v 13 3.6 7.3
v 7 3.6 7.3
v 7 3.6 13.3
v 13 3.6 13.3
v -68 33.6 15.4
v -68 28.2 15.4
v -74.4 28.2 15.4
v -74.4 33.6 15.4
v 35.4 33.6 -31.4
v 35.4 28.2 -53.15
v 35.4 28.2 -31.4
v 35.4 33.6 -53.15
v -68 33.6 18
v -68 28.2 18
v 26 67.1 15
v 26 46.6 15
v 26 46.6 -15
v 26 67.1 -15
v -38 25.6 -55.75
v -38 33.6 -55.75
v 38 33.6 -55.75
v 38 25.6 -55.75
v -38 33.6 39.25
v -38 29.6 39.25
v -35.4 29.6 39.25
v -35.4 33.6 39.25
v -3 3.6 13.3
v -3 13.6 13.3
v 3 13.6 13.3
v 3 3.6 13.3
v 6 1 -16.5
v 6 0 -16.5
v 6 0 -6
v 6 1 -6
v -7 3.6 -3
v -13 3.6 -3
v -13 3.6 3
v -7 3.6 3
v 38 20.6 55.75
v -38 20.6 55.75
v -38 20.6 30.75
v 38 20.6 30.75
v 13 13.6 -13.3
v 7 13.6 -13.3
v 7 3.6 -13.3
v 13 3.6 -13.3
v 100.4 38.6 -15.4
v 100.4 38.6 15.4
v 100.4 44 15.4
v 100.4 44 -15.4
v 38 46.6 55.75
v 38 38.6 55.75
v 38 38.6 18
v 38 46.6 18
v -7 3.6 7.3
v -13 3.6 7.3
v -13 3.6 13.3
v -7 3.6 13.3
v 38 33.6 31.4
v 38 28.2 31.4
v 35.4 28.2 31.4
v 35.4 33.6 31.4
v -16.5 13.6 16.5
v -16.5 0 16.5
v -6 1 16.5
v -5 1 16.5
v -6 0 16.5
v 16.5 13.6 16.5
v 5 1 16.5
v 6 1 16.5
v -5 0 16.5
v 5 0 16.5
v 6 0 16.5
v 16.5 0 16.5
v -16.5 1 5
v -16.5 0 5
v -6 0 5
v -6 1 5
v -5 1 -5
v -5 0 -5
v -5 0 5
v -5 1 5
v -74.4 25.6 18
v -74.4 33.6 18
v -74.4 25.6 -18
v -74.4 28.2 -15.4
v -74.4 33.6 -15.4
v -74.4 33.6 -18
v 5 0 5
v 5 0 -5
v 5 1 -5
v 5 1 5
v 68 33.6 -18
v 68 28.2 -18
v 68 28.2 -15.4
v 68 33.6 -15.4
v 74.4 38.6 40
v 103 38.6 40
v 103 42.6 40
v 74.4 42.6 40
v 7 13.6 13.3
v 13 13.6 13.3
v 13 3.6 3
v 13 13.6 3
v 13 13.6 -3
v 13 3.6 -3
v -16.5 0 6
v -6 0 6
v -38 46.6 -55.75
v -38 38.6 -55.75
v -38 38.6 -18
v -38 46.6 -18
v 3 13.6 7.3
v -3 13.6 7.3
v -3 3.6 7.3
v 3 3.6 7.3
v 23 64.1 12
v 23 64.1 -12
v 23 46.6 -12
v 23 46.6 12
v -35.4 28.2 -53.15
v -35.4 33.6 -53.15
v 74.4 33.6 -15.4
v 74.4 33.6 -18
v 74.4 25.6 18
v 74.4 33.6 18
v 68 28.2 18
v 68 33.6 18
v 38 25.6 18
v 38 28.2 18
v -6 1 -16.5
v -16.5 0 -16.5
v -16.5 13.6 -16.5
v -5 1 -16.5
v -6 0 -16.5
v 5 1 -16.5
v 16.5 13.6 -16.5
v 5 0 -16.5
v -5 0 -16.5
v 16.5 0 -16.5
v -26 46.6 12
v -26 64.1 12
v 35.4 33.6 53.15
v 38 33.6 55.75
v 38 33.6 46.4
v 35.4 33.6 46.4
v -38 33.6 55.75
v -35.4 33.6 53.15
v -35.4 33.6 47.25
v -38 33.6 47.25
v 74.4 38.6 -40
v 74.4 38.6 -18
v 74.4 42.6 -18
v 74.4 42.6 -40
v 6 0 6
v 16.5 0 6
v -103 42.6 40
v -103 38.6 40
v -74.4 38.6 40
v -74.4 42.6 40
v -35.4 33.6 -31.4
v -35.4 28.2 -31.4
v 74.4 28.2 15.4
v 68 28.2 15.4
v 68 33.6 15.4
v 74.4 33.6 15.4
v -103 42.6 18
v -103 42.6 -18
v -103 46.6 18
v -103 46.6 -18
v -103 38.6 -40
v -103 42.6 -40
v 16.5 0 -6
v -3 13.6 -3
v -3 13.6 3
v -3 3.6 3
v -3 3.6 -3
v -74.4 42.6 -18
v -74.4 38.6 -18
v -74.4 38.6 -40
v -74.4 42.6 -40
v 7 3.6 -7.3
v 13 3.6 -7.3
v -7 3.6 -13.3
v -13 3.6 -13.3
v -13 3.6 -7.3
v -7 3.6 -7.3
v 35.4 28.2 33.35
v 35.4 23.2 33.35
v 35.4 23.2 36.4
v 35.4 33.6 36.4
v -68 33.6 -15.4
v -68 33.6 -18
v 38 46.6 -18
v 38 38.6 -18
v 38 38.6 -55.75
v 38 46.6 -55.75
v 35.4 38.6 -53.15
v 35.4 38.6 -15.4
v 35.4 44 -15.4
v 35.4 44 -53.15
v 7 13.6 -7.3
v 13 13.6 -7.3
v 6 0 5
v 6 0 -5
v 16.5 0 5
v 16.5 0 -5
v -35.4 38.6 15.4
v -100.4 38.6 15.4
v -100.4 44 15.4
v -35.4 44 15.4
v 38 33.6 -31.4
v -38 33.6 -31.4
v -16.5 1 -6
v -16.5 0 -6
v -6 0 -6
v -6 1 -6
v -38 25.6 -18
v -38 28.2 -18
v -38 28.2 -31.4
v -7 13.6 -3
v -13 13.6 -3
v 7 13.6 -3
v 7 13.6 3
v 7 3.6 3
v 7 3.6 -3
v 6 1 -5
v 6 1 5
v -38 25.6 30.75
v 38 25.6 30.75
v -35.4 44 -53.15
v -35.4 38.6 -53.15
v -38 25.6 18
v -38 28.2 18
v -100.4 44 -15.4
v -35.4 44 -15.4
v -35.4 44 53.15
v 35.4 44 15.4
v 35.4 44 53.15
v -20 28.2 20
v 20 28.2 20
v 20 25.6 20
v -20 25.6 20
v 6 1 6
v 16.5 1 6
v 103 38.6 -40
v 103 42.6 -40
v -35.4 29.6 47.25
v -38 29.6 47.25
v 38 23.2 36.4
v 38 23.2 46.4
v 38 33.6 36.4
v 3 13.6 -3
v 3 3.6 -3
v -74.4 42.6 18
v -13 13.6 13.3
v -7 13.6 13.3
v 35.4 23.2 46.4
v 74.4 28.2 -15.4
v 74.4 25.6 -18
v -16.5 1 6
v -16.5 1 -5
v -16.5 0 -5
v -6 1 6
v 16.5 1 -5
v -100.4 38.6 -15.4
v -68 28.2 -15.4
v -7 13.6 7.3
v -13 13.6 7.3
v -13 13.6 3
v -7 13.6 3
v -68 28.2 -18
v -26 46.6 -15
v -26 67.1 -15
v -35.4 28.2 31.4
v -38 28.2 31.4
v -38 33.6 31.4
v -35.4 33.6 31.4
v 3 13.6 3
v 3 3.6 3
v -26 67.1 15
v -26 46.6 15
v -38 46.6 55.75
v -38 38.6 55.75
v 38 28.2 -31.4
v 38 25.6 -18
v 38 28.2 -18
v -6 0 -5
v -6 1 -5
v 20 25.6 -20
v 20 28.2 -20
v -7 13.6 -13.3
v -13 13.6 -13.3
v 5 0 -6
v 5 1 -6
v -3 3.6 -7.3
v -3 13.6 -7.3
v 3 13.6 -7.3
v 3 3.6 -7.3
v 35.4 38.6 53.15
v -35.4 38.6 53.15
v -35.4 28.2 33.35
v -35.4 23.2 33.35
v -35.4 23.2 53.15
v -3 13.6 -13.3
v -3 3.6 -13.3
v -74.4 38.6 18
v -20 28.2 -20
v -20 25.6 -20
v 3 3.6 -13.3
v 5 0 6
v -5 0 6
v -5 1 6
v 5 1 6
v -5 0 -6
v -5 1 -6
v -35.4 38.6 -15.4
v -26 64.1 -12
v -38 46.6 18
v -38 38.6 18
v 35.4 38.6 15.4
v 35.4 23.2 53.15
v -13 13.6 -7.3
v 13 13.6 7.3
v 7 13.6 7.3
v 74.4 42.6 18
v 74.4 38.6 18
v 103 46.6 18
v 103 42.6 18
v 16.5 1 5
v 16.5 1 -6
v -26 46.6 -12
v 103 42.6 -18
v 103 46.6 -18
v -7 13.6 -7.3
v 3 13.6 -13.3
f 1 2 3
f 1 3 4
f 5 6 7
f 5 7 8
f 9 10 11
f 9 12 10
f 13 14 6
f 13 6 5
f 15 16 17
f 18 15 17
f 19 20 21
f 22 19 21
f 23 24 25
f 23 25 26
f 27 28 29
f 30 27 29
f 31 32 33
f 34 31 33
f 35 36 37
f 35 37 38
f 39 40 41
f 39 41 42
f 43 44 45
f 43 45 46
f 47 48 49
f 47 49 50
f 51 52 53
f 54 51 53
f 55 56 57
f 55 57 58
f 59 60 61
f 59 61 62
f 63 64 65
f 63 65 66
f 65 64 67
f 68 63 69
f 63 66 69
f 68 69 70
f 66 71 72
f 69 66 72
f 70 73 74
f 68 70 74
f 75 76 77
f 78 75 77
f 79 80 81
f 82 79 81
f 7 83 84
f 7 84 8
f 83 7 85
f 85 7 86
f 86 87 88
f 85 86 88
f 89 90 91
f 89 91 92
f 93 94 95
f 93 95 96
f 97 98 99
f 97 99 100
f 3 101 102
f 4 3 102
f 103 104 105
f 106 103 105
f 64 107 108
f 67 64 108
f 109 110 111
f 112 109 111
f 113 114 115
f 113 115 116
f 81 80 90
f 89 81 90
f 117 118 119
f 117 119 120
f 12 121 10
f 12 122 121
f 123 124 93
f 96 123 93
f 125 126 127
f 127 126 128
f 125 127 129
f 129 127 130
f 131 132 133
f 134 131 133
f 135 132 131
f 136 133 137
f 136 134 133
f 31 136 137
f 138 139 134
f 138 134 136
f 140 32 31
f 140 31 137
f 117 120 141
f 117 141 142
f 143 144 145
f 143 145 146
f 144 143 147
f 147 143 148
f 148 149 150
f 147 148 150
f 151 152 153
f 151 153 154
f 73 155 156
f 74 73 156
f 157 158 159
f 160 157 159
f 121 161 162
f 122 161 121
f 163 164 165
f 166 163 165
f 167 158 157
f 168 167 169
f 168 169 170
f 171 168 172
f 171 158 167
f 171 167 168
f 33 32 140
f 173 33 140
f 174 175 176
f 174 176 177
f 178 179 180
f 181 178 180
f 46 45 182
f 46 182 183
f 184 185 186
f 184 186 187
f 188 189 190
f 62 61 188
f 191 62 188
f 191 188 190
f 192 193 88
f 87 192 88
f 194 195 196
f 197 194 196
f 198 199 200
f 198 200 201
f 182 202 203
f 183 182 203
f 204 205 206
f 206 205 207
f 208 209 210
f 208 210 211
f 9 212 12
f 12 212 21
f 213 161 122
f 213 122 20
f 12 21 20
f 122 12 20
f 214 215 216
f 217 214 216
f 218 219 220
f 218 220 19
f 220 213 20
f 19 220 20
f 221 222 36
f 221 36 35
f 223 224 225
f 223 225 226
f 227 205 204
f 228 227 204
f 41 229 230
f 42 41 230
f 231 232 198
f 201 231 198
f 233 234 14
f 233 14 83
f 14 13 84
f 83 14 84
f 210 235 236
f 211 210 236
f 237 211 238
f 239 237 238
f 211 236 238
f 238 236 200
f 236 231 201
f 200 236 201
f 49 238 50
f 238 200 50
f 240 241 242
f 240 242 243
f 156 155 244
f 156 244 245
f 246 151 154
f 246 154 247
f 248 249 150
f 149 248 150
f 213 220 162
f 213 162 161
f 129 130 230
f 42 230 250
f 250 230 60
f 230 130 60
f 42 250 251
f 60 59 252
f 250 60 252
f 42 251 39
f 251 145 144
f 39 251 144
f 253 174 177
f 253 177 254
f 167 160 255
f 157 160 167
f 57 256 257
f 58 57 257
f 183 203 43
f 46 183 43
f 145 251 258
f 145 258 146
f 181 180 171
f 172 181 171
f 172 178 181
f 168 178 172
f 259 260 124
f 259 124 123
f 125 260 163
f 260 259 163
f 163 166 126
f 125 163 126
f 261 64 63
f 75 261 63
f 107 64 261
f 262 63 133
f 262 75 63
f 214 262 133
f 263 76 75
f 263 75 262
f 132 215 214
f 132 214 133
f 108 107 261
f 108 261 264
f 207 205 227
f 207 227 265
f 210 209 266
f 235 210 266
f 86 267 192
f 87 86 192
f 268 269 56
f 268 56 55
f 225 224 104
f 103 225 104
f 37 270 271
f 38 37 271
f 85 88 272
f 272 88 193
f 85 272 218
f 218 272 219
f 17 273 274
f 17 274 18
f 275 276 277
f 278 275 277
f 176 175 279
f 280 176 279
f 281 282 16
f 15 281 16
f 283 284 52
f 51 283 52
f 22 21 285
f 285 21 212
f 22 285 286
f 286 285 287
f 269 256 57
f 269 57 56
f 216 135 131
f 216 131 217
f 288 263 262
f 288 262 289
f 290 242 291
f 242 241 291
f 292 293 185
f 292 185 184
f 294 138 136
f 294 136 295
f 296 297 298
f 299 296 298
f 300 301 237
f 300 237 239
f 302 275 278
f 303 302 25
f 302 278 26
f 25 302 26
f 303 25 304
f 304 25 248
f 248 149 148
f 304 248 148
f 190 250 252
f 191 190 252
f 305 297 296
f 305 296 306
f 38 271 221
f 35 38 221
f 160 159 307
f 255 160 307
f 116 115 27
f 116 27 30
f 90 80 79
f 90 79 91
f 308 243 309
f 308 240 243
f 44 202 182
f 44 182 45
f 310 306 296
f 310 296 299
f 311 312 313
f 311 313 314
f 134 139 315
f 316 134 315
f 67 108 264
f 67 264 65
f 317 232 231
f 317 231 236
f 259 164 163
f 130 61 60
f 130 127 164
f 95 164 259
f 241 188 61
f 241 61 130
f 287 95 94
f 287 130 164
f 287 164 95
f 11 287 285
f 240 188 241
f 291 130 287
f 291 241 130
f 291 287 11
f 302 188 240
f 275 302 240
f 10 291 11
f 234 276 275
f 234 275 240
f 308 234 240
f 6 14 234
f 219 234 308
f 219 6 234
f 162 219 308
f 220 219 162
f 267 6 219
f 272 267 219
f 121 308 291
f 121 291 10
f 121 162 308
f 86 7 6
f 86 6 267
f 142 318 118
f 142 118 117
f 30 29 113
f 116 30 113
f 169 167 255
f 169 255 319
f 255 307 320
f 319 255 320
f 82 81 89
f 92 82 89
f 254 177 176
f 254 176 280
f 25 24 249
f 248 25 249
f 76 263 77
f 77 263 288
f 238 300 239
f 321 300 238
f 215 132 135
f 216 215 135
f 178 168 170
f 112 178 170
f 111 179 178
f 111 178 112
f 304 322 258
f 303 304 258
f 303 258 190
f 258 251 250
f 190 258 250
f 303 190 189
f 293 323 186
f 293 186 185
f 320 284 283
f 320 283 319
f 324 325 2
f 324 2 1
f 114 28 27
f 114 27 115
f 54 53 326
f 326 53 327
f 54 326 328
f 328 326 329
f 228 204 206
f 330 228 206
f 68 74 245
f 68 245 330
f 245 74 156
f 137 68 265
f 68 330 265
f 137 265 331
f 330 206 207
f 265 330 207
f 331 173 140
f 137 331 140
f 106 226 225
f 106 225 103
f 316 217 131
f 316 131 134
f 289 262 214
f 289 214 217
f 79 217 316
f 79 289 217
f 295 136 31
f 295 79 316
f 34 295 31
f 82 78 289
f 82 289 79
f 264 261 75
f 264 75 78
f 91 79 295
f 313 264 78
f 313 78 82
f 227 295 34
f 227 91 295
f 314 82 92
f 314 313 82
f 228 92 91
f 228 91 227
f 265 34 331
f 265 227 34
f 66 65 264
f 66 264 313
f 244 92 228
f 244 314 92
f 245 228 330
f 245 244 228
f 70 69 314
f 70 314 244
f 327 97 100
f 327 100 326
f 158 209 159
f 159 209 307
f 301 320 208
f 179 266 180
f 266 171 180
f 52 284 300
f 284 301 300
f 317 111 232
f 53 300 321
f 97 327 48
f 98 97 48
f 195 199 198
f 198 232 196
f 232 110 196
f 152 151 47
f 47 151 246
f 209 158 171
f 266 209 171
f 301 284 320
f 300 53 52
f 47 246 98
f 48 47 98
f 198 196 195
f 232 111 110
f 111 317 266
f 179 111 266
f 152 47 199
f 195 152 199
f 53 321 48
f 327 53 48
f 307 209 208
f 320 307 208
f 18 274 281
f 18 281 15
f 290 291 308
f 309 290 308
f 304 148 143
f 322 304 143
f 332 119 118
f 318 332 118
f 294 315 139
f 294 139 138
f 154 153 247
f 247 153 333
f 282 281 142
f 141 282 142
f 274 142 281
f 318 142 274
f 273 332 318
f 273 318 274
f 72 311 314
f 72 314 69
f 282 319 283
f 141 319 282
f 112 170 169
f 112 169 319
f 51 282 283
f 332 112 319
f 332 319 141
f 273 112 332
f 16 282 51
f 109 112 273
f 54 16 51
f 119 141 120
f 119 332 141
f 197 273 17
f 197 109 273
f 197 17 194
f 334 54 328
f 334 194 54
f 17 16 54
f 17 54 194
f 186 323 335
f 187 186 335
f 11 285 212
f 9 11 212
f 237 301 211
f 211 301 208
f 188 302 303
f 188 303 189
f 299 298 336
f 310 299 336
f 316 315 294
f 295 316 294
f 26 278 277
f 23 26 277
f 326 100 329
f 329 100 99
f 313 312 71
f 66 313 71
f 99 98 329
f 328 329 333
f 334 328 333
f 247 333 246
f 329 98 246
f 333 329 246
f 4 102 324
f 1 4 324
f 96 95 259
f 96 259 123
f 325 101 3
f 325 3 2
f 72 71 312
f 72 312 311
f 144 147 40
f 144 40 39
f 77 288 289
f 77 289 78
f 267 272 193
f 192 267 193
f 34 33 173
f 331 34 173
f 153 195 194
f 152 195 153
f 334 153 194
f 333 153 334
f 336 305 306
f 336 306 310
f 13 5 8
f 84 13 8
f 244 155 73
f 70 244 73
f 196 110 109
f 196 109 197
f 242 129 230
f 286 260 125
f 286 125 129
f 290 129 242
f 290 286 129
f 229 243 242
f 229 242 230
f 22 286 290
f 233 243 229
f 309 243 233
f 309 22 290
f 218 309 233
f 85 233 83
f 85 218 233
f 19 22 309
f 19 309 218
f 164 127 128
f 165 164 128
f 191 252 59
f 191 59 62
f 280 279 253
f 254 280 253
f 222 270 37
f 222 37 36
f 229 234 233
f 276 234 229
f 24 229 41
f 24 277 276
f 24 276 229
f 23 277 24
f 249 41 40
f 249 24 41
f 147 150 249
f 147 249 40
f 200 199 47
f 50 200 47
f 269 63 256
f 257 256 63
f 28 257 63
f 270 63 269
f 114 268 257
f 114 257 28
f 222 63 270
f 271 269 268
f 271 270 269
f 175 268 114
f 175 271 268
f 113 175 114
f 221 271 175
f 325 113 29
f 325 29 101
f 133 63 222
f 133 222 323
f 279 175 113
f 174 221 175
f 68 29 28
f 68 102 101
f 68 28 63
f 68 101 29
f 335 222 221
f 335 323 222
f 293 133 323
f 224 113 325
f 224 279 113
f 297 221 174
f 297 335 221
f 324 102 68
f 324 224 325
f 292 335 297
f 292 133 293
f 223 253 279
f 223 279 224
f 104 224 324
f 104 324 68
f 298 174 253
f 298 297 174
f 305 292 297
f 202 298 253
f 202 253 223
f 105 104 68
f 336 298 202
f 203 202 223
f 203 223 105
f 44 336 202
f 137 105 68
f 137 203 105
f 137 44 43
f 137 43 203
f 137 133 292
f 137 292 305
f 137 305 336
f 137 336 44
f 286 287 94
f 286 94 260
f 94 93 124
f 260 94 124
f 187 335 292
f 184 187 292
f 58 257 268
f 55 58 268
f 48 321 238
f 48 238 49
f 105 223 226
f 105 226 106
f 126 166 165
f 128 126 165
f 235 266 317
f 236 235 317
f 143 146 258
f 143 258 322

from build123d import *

# Parameters (mm, degrees)
SKETCH1_W               = 33
SKETCH1_H               = 33
BOSS_EXTRUDE1_DEPTH     = 13.6
SKETCH2_W               = 6
SKETCH2_H               = 6
CUT_EXTRUDE1_DEPTH      = 10
LPATTERN1_COUNT         = 5
LPATTERN1_PITCH         = 10.3
LPATTERN2_COUNT         = 2
LPATTERN2_PITCH         = 10.3
SKETCH3_W               = 1
SKETCH3_H               = 33
SKETCH3_W_2             = 33
SKETCH3_H_2             = 1
CUT_EXTRUDE_THIN1_DEPTH = 1
SKETCH4_W               = 76
SKETCH4_H               = 37.75
SKETCH4_H_2             = 36
SKETCH4_W_2             = 65
BOSS_EXTRUDE2_DEPTH     = 8
SHELL1_T                = -2.6
SKETCH5_W               = 40
SKETCH5_H               = 40
BOSS_EXTRUDE3_DEPTH     = 8
SKETCH6_W               = 76
SKETCH6_H               = 25
BOSS_EXTRUDE4_DEPTH     = 5
SHELL2_T                = -2.6
BOSS_EXTRUDE5_DEPTH     = 4
SKETCH8_W               = 8
SKETCH8_H               = 8
CUT_EXTRUDE2_DEPTH      = 2.6
SKETCH9_W               = 52
SKETCH9_H               = 30
BOSS_EXTRUDE6_DEPTH     = 20.5
SKETCH10_W              = 24
SKETCH10_H              = 17.5
CUT_EXTRUDE3_DEPTH      = 49
SKETCH11_W              = 16
SKETCH11_H              = 5.4
CUT_EXTRUDE4_DEPTH      = 2.6
SKETCH13_W              = 30
SKETCH13_H              = 5.4
CUT_EXTRUDE5_DEPTH      = 2.6
MIRROR3_COPY_1_SKETCH_W = 16
MIRROR3_COPY_1_SKETCH_H = 5.4
MIRROR3_COPY_1_DEPTH    = 2.6
MIRROR3_COPY_2_SKETCH_W = 30
MIRROR3_COPY_2_SKETCH_H = 5.4
MIRROR3_COPY_2_DEPTH    = 2.6
SKETCH14_W              = 10
SKETCH14_H              = 10.4
CUT_EXTRUDE6_DEPTH      = 2.6
CUT_EXTRUDE7_DEPTH      = 198.689737973
CUT_EXTRUDE7_DEPTH_BACK = 198.689737973
SKETCH15_W              = 30.8
SKETCH15_H              = 5.4


with BuildPart() as part:
    # Sketch1 → Boss-Extrude1 (new body)
    with BuildSketch(Plane(origin=(0, 0, 0), x_dir=(1, 0, 0), z_dir=(0, 1, 0))):
        Rectangle(SKETCH1_W, SKETCH1_H)
    extrude(amount=BOSS_EXTRUDE1_DEPTH)

    # Sketch2 → Cut-Extrude1 (cut)
    with BuildSketch(Plane(origin=(0, 13.6, 0), x_dir=(1, 0, 0), z_dir=(0, 1, 0))):
        Rectangle(SKETCH2_W, SKETCH2_H)
        with Locations((-10, 0)):
            Rectangle(SKETCH2_W, SKETCH2_H)
        with Locations((10, 0)):
            Rectangle(SKETCH2_W, SKETCH2_H)
    cut_extrude1 = extrude(amount=-CUT_EXTRUDE1_DEPTH, mode=Mode.SUBTRACT)

    # LPattern1: Cut-Extrude1 ×5
    with Locations(*[(0, 0, i * LPATTERN1_PITCH) for i in range(1, LPATTERN1_COUNT)]):
        add(cut_extrude1, mode=Mode.SUBTRACT)

    # LPattern2: Cut-Extrude1 ×2
    with Locations(*[(0, 0, -i * LPATTERN2_PITCH) for i in range(1, LPATTERN2_COUNT)]):
        add(cut_extrude1, mode=Mode.SUBTRACT)

    # Sketch3 → Cut-Extrude-Thin1 (cut)
    with BuildSketch(Plane.XZ):
        with Locations((-5.5, 0)):
            Rectangle(SKETCH3_W, SKETCH3_H)
        with Locations((5.5, 0)):
            Rectangle(SKETCH3_W, SKETCH3_H)
        with Locations((0, 5.5)):
            Rectangle(SKETCH3_W_2, SKETCH3_H_2)
        with Locations((0, -5.5)):
            Rectangle(SKETCH3_W_2, SKETCH3_H_2)
    extrude(amount=-CUT_EXTRUDE_THIN1_DEPTH, mode=Mode.SUBTRACT)


with BuildPart() as body_2:
    # Sketch4 → Boss-Extrude2 (new body)
    with BuildSketch(Plane(origin=(0, 38.6, 0), x_dir=(1, 0, 0), z_dir=(0, 1, 0))):
        with Locations((0, 36.875)):
            Rectangle(SKETCH4_W, SKETCH4_H)
        Rectangle(SKETCH4_W, SKETCH4_H_2)
        with Locations((-70.5, 0)):
            Rectangle(SKETCH4_W_2, SKETCH4_H_2)
        with Locations((0, -36.875)):
            Rectangle(SKETCH4_W, SKETCH4_H)
        with Locations((70.5, 0)):
            Rectangle(SKETCH4_W_2, SKETCH4_H_2)
    extrude(amount=BOSS_EXTRUDE2_DEPTH)

    # Shell1
    shell1_openings = [body_2.faces().sort_by_distance(p)[0] for p in [
        (0, 38.6, 0),
    ]]
    offset(amount=SHELL1_T, openings=shell1_openings, kind=Kind.INTERSECTION)

    # Sketch7 → Boss-Extrude5 (add)
    with BuildSketch(Plane.XZ.offset(-38.6)):
        Polygon((74.4, 15.4), (100.4, 15.4), (100.4, -15.4), (74.4, -15.4), (74.4, -40), (103, -40), (103, 40), (74.4, 40), align=None)
    boss_extrude5 = extrude(amount=-BOSS_EXTRUDE5_DEPTH)

    # Mirror1: Boss-Extrude5 across plane
    add(boss_extrude5.mirror(Plane(origin=(0, 0, 0), x_dir=(0, 0, 1), z_dir=(1, 0, 0))))

    # Sketch9 → Boss-Extrude6 (add)
    with BuildSketch(Plane(origin=(0, 46.6, 0), x_dir=(1, 0, 0), z_dir=(0, 1, 0))):
        Rectangle(SKETCH9_W, SKETCH9_H)
    extrude(amount=BOSS_EXTRUDE6_DEPTH)

    # Sketch10 → Cut-Extrude3 (cut)
    with BuildSketch(Plane.ZY.offset(26)):
        with Locations((0, 55.35)):
            Rectangle(SKETCH10_W, SKETCH10_H)
    extrude(amount=-CUT_EXTRUDE3_DEPTH, mode=Mode.SUBTRACT)


with BuildPart() as body_3:
    # Sketch5 → Boss-Extrude3 (new body)
    with BuildSketch(Plane(origin=(0, 33.6, 0), x_dir=(-1, 0, 0), z_dir=(0, -1, 0))):
        Polygon((-74.4, 18), (-74.4, -18), (-38, -18), (-38, -55.75), (38, -55.75), (38, -18), (74.4, -18), (74.4, 18), (38, 18), (38, 55.75), (-38, 55.75), (-38, 18), align=None)
        Rectangle(SKETCH5_W, SKETCH5_H, mode=Mode.SUBTRACT)
    extrude(amount=BOSS_EXTRUDE3_DEPTH)

    # Sketch6 → Boss-Extrude4 (add)
    with BuildSketch(Plane.XZ.offset(-25.6)):
        with Locations((0, 43.25)):
            Rectangle(SKETCH6_W, SKETCH6_H)
    extrude(amount=BOSS_EXTRUDE4_DEPTH)

    # Shell2
    shell2_openings = [body_3.faces().sort_by_distance(p)[0] for p in [
        (72.540599828, 33.6, 0),
        (-20, 29.6, 0),
        (0, 29.6, -20),
        (20, 29.6, 0),
        (0, 29.6, 20),
    ]]
    offset(amount=SHELL2_T, openings=shell2_openings, kind=Kind.INTERSECTION)

    # Sketch8 → Cut-Extrude2 (cut)
    with BuildSketch(Plane.ZY.offset(38)):
        with Locations((43.25, 33.6)):
            Rectangle(SKETCH8_W, SKETCH8_H)
    extrude(amount=-CUT_EXTRUDE2_DEPTH, mode=Mode.SUBTRACT)

    # Sketch11 → Cut-Extrude4 (cut)
    with BuildSketch(Plane(origin=(38, 0, 0), x_dir=(0, 0, -1), z_dir=(1, 0, 0))):
        with Locations((-23.4, 30.9)):
            Rectangle(SKETCH11_W, SKETCH11_H)
    cut_extrude4 = extrude(amount=-CUT_EXTRUDE4_DEPTH, mode=Mode.SUBTRACT)

    # Sketch13 → Cut-Extrude5 (cut)
    with BuildSketch(Plane.XY.offset(18)):
        with Locations((53, 30.9)):
            Rectangle(SKETCH13_W, SKETCH13_H)
    cut_extrude5 = extrude(amount=-CUT_EXTRUDE5_DEPTH, mode=Mode.SUBTRACT)

    # Mirror2: Cut-Extrude4, Cut-Extrude5 across plane
    add(cut_extrude4.mirror(Plane.XY), mode=Mode.SUBTRACT)
    add(cut_extrude5.mirror(Plane.XY), mode=Mode.SUBTRACT)

    # Mirror3: Cut-Extrude4, Cut-Extrude5 across plane
    add(cut_extrude4.mirror(Plane(origin=(0, 0, 0), x_dir=(0, 0, 1), z_dir=(1, 0, 0))), mode=Mode.SUBTRACT)
    add(cut_extrude5.mirror(Plane(origin=(0, 0, 0), x_dir=(0, 0, 1), z_dir=(1, 0, 0))), mode=Mode.SUBTRACT)

    # Mirror3 copy 1 sketch → Mirror3 copy 1 (cut)
    with BuildSketch(Plane.ZY.offset(38)):
        with Locations((-23.4, 30.9)):
            Rectangle(MIRROR3_COPY_1_SKETCH_W, MIRROR3_COPY_1_SKETCH_H)
    extrude(amount=-MIRROR3_COPY_1_DEPTH, mode=Mode.SUBTRACT)

    # Mirror3 copy 2 sketch → Mirror3 copy 2 (cut)
    with BuildSketch(Plane(origin=(0, 0, -18), x_dir=(-1, 0, 0), z_dir=(0, 0, -1))):
        with Locations((53, 30.9)):
            Rectangle(MIRROR3_COPY_2_SKETCH_W, MIRROR3_COPY_2_SKETCH_H)
    extrude(amount=-MIRROR3_COPY_2_DEPTH, mode=Mode.SUBTRACT)

    # Sketch14 → Cut-Extrude6 (cut)
    with BuildSketch(Plane(origin=(38, 0, 0), x_dir=(0, 0, -1), z_dir=(1, 0, 0))):
        with Locations((-41.4, 28.4)):
            Rectangle(SKETCH14_W, SKETCH14_H)
    extrude(amount=-CUT_EXTRUDE6_DEPTH, mode=Mode.SUBTRACT)

    # Sketch15 → Cut-Extrude7 (cut, two sides: drawn at the far end of the back side and taken through both)
    with BuildSketch(Plane(origin=(74.4, 0, 0), x_dir=(0, 0, -1), z_dir=(1, 0, 0)).offset(-CUT_EXTRUDE7_DEPTH_BACK)):
        with Locations((0, 30.9)):
            Rectangle(SKETCH15_W, SKETCH15_H)
    extrude(amount=CUT_EXTRUDE7_DEPTH + CUT_EXTRUDE7_DEPTH_BACK, mode=Mode.SUBTRACT)


solid = Compound([part.part, body_2.part, body_3.part])
